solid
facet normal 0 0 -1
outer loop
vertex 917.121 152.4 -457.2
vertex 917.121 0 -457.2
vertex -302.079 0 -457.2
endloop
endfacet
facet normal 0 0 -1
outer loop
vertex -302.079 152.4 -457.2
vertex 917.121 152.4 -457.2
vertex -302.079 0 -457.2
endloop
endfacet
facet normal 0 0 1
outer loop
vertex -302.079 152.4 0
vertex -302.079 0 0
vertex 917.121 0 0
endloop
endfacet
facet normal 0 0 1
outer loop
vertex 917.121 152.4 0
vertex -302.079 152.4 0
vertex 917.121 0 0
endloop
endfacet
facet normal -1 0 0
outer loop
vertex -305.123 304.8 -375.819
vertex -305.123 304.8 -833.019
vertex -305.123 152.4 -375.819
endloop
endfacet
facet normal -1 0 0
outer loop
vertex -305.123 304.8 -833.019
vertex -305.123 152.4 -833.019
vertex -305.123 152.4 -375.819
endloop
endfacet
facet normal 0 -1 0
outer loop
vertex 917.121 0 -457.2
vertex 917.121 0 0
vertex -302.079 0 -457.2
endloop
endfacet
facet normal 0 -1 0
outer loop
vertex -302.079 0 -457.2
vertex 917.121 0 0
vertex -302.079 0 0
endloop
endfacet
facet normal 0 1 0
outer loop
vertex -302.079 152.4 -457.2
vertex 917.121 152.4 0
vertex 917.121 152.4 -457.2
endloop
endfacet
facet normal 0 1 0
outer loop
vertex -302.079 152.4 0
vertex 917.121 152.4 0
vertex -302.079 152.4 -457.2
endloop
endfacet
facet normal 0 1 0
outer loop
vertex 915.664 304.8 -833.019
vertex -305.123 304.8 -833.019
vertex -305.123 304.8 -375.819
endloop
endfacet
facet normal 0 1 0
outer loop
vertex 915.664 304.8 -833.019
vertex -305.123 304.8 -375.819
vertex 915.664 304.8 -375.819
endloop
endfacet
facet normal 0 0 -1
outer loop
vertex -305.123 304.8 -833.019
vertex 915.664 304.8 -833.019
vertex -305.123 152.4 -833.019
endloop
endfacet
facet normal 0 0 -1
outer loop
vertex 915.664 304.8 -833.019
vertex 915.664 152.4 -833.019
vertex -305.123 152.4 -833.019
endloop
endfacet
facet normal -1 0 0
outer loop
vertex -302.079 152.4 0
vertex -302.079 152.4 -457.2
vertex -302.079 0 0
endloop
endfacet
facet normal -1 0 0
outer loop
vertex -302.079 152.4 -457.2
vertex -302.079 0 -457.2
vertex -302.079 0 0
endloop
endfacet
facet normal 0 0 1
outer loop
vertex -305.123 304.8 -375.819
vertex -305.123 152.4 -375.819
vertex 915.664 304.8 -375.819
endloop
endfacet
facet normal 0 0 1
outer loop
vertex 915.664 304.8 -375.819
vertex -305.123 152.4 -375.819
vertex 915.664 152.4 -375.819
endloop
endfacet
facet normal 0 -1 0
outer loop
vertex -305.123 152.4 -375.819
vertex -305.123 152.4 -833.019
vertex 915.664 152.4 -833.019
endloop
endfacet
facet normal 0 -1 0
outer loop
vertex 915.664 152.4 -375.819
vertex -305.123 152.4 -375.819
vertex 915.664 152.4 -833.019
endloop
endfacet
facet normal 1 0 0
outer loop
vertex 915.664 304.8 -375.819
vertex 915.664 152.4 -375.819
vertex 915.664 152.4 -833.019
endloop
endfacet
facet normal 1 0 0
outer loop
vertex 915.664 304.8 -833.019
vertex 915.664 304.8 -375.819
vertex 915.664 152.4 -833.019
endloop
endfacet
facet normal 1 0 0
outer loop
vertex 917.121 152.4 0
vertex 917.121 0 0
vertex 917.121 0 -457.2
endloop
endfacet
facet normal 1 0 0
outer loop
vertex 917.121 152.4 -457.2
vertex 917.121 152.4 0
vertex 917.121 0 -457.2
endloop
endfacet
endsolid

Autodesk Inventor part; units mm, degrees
ref_plane "YZ Plane" through (0, 0, 0) normal (1, 0, 0) x (0, 1, 0)
ref_plane "XZ Plane" through (0, 0, 0) normal (0, 1, 0) x (-1, 0, 0)
ref_plane "XY Plane" through (0, 0, 0) normal (0, 0, 1) x (1, 0, 0)
sketch "Sketch1" plane through (0, 0, 0) normal (0, 1, 0) x (-1, 0, 0)
  line L0 (302.0789, 0) -> (-917.1211, 0)
  line L1 (-917.1211, 0) -> (-917.1211, -457.2)
  line L2 (-917.1211, -457.2) -> (302.0789, -457.2)
  line L3 (302.0789, -457.2) -> (302.0789, 0)
  point P0 (0, 0)
  dimension "d0" = 1219.2
  dimension "d1" = 457.2
extrude "Extrusion1" add sketch "Sketch1" along normal blind 152.4
sketch "Sketch2" plane through (611.9978, 152.4, -833.019) normal (0, 1, 0) x (1, 0, 0)
  line L0 (303.6664, 0) -> (-917.1211, 0)
  line L1 (-917.1211, 0) -> (-917.1211, -457.2)
  line L2 (-917.1211, -457.2) -> (303.6664, -457.2)
  line L3 (303.6664, -457.2) -> (303.6664, 0)
  point P0 (0, 0)
  dimension "d4" = 1220.7875
  dimension "d5" = 457.2
extrude "Extrusion2" add sketch "Sketch2" along normal blind 152.4 separate body
properties part number "Standard - Steps" material "Limestone"
